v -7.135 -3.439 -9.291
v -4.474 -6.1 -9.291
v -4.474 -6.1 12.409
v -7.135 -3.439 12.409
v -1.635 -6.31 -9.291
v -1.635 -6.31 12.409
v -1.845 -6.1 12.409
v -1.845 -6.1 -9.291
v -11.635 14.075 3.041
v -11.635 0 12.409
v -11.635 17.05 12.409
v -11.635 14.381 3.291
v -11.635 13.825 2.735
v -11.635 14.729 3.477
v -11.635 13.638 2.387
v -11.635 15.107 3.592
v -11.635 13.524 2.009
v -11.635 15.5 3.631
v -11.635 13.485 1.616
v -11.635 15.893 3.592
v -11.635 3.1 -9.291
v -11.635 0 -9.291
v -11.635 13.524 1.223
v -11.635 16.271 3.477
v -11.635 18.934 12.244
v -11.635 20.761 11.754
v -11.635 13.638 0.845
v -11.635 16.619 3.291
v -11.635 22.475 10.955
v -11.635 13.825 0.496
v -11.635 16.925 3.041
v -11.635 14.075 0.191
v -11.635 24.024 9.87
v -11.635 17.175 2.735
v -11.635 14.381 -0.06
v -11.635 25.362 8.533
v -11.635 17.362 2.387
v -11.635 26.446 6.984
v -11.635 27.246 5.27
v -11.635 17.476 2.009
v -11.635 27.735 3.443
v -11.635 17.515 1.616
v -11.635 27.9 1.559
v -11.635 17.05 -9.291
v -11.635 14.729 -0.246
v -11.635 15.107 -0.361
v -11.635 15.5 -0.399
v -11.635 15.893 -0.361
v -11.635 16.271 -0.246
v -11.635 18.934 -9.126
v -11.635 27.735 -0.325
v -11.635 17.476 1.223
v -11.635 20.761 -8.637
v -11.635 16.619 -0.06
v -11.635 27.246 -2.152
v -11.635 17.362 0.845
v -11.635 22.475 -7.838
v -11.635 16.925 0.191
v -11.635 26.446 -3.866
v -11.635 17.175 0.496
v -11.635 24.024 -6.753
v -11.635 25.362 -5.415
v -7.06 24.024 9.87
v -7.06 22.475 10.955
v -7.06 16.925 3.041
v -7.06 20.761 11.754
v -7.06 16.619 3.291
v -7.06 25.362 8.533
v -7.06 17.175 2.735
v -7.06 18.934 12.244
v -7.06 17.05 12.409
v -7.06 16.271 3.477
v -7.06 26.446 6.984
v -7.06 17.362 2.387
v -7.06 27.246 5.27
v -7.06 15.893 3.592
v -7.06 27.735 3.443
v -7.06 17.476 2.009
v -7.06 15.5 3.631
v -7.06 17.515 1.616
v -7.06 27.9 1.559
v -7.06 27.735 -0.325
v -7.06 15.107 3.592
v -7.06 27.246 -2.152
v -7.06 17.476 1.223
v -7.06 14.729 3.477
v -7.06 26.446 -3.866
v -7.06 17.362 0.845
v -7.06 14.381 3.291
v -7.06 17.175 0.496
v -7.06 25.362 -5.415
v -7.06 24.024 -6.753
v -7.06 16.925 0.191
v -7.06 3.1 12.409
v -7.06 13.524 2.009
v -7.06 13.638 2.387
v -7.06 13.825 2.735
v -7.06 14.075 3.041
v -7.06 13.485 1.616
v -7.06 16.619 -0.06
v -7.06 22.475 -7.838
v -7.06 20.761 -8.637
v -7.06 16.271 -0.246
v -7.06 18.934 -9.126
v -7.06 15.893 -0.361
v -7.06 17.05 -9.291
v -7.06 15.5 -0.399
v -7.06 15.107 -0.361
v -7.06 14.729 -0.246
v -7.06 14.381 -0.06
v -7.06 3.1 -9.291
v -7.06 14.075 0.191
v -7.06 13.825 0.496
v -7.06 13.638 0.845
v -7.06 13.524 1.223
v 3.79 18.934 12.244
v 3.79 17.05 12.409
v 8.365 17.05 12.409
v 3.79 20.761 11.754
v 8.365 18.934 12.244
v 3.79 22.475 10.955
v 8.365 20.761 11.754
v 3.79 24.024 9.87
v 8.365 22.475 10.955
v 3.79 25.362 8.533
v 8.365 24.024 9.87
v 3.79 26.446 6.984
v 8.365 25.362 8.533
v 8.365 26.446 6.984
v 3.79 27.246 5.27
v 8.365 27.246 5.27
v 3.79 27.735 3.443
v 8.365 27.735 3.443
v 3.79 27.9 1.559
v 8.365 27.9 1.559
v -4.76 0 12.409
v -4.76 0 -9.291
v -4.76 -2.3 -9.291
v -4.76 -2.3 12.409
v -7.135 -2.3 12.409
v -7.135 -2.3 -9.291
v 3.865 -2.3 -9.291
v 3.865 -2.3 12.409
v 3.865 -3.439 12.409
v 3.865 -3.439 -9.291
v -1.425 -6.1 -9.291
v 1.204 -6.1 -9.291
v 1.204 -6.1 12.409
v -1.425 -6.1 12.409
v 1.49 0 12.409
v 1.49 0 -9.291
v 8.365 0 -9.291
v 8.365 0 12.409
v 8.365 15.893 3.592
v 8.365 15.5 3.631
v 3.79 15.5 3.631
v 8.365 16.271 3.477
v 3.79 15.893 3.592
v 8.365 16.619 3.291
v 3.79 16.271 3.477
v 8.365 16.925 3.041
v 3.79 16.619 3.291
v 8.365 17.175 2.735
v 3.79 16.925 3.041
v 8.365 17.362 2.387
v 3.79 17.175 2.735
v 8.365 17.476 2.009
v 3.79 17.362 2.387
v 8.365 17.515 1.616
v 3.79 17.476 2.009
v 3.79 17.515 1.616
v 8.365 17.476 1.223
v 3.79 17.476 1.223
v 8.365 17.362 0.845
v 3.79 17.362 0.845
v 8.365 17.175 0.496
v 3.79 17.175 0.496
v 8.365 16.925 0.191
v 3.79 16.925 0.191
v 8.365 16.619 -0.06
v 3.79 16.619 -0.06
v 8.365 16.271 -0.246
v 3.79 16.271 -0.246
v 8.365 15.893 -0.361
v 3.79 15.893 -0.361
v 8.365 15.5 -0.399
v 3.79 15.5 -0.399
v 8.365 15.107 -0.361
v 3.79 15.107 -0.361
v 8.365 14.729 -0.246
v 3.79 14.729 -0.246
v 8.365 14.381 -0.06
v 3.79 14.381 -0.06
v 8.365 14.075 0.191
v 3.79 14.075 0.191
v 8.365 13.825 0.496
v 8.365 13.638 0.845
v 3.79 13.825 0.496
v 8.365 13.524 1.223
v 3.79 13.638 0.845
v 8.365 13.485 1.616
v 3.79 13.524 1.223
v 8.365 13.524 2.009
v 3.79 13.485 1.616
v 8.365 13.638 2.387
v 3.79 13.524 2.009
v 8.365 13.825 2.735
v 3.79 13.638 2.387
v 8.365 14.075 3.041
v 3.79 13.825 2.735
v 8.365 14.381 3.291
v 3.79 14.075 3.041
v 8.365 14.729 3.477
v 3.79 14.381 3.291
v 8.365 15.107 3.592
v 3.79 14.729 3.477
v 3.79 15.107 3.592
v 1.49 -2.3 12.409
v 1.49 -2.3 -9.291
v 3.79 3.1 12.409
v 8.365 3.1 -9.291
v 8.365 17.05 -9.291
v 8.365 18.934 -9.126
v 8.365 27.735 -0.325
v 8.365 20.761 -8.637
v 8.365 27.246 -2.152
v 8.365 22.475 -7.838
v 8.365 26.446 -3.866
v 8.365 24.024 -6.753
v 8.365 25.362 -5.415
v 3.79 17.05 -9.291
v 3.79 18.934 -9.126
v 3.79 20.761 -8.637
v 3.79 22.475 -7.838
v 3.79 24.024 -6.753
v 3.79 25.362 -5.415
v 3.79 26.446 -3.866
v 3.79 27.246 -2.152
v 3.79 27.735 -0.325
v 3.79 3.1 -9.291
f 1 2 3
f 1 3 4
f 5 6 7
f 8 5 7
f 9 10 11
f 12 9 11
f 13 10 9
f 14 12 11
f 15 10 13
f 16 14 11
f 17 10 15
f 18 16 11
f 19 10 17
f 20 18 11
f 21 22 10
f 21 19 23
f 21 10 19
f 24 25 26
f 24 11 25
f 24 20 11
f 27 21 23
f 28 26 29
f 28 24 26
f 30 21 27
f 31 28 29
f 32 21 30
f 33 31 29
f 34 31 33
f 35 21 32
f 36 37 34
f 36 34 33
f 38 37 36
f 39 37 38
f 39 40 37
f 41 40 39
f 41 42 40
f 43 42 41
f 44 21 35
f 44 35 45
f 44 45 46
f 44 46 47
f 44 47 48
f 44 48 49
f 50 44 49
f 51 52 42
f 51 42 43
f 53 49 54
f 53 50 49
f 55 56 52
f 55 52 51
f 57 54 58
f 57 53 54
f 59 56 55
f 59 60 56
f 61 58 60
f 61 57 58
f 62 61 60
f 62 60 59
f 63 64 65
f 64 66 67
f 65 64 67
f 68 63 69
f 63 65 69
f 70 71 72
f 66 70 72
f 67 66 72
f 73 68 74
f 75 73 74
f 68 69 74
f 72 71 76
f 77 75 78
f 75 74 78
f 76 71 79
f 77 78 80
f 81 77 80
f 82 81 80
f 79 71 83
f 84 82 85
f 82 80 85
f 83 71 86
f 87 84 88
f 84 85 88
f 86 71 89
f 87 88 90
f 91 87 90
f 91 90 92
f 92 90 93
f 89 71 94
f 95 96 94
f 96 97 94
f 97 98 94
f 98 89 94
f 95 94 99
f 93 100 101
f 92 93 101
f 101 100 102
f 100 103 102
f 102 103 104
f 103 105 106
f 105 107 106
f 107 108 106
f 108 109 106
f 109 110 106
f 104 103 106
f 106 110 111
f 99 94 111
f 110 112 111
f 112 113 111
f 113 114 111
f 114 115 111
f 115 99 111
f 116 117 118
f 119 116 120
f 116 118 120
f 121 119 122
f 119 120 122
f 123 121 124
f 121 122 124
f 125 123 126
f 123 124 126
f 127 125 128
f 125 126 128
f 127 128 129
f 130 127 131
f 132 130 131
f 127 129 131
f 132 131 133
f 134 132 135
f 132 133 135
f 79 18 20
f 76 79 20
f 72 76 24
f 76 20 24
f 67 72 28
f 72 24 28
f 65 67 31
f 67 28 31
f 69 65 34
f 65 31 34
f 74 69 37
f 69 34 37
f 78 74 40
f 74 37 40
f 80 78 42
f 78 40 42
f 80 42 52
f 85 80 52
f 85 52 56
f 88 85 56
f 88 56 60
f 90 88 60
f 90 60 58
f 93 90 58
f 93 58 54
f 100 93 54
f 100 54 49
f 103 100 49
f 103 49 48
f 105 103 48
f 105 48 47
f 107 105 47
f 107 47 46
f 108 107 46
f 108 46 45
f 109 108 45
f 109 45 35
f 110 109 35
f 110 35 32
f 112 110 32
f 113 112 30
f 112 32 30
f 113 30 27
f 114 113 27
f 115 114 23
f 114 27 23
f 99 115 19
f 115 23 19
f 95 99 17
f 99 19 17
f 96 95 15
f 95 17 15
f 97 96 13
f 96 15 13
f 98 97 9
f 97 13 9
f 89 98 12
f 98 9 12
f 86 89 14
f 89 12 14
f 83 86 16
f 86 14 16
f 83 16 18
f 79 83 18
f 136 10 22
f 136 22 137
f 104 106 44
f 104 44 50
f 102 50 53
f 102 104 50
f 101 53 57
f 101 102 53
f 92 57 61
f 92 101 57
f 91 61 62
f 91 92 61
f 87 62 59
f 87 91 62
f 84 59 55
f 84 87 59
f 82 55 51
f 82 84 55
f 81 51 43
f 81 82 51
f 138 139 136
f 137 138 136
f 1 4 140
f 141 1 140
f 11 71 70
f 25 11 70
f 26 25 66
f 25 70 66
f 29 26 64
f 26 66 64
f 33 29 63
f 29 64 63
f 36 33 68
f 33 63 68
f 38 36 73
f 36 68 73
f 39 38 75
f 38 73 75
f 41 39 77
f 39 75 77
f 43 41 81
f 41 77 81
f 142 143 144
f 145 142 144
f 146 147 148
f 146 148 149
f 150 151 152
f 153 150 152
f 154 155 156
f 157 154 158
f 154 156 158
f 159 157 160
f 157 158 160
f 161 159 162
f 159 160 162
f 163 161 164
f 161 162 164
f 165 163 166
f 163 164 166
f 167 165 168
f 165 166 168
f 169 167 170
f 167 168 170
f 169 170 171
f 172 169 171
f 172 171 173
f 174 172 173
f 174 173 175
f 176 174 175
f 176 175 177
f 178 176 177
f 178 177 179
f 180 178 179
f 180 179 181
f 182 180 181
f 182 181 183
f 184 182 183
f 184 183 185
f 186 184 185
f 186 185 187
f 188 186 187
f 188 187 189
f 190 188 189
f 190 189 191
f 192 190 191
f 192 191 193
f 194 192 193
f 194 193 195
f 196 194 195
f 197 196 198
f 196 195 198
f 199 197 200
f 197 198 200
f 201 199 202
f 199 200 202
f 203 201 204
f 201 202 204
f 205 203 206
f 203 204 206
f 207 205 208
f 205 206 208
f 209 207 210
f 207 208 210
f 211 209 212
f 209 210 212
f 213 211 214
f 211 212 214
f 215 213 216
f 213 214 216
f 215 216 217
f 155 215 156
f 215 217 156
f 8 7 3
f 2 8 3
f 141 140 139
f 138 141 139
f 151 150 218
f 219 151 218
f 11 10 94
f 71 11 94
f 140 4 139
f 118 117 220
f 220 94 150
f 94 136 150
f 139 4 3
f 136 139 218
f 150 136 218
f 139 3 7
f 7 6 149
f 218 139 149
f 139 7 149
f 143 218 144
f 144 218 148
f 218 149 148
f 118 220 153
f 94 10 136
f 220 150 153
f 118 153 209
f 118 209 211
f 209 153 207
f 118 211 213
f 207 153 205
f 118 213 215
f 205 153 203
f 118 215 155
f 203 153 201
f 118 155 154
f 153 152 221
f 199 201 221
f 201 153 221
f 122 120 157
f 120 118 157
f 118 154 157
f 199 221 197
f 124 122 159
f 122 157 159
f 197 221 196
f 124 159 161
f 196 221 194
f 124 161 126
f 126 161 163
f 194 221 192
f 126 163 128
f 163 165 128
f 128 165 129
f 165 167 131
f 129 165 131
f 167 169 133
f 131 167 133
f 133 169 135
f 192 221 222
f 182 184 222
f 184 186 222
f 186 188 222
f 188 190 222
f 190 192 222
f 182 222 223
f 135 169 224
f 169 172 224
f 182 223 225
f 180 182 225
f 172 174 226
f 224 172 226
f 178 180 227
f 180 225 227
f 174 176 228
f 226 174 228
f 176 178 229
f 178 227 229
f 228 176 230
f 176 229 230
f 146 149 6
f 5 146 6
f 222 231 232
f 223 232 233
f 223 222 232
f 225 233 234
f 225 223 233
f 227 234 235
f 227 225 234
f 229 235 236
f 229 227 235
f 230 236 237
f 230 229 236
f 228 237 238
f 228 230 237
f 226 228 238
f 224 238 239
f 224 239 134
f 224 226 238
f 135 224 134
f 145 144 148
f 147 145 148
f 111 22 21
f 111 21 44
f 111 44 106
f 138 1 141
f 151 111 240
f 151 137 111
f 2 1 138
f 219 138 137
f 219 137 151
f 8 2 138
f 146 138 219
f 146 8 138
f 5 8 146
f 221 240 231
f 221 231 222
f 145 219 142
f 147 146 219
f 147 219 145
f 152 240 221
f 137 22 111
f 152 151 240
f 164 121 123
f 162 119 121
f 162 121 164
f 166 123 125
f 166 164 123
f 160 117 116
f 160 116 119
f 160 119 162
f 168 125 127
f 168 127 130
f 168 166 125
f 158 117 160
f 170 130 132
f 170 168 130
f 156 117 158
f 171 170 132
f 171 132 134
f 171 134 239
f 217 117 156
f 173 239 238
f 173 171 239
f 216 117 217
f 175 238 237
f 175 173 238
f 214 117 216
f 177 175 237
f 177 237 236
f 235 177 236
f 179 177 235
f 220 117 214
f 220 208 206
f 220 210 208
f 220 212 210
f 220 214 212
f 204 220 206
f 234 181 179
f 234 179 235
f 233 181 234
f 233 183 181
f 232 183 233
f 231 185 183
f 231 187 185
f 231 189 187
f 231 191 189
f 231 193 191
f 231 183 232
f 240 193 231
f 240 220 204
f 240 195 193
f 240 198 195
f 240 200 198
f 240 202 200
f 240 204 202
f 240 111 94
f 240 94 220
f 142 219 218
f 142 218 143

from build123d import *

# Parameters (mm, degrees)
SKETCH1_W           = 150
SKETCH1_H           = 70
BOSS_EXTRUDE1_DEPTH = 10
SKETCH2_W           = 18
SKETCH2_H           = 70
BOSS_EXTRUDE2_DEPTH = 80
FILLET1_R           = 35
SKETCH3_R           = 6.5
CUT_EXTRUDE1_DEPTH  = 164.102034121
RIB1_REACH          = 134.904
SKETCH5_WALL_W      = 321.142477346
SKETCH5_WALL_H      = 40
SKETCH7_W           = 43.830511012
SKETCH7_H           = 10.028409091
CUT_EXTRUDE2_DEPTH  = 80
SCALE1_SCALE        = 0.31
BOSS_EXTRUDE4_DEPTH = 21.7
CUT_EXTRUDE5_REACH  = 46.882
SKETCH11_W          = 1.005
SKETCH11_H          = 10.85
SKETCH11_H_2        = 13.95


with BuildPart() as part:
    # Sketch1 → Boss-Extrude1 (new body)
    with BuildSketch(Plane(origin=(0, 0, 0), x_dir=(1, 0, 0), z_dir=(0, 1, 0))):
        with Locations((14.225473782, -5.028409091)):
            Rectangle(SKETCH1_W, SKETCH1_H)
    extrude(amount=BOSS_EXTRUDE1_DEPTH)

    # Sketch2 → Boss-Extrude2 (add)
    with BuildSketch(Plane(origin=(0, 10, 0), x_dir=(1, 0, 0), z_dir=(0, 1, 0))):
        with Locations((-31.774526218, -5.028409091)):
            Rectangle(SKETCH2_W, SKETCH2_H)
        with Locations((21.225473782, -5.028409091)):
            Rectangle(SKETCH2_W, SKETCH2_H)
    extrude(amount=BOSS_EXTRUDE2_DEPTH)

    # Fillet1
    fillet1_edges = [part.edges().sort_by_distance(p)[0] for p in [
        (21.225473782, 90, 40.028409091),
        (21.225473782, 90, -29.971590909),
        (-31.774526218, 90, -29.971590909),
        (-31.774526218, 90, 40.028409091),
    ]]
    fillet(fillet1_edges, radius=FILLET1_R - 0.0001)  # a hair under: the kernel refuses the full size

    # Sketch3 → Cut-Extrude1 (cut, through all)
    with BuildSketch(Plane.ZY.offset(40.774526218)):
        with Locations((5.212032143, 50)):
            Circle(SKETCH3_R)
    extrude(amount=-CUT_EXTRUDE1_DEPTH, mode=Mode.SUBTRACT)

    # Sketch5 wall → Rib1 (add, up to next)
    with BuildSketch(Plane(origin=(52.140729288, 25.194278726, 0), x_dir=(0.821802771323, -0.569772064116, 0), z_dir=(0.569772064116, 0.821802771323, 0)), mode=Mode.PRIVATE) as rib1_sk1:
        Rectangle(SKETCH5_WALL_W, SKETCH5_WALL_H)
    rib1_tool1 = extrude(rib1_sk1.sketch, amount=-RIB1_REACH, mode=Mode.PRIVATE) - part.part
    add(rib1_tool1.solids().sort_by_distance((52.140729288, 25.194278726, 0))[0])

    # Sketch7 → Cut-Extrude2 (cut)
    with BuildSketch(Plane(origin=(0, 10, 0), x_dir=(1, 0, 0), z_dir=(0, 1, 0))):
        with Locations((52.140729288, 14.985795454)):
            Rectangle(SKETCH7_W, SKETCH7_H)
    extrude(amount=CUT_EXTRUDE2_DEPTH, mode=Mode.SUBTRACT)


with BuildPart() as part_1:
    # Scale1: scaled about (0, 0, 0)
    add(part.part.scale(SCALE1_SCALE))

    # Sketch10 → Boss-Extrude4 (add)
    with BuildSketch(Plane(origin=(0, 0, -9.291193182), x_dir=(-1, 0, 0), z_dir=(0, 0, -1))):
        Polygon((4.760103128, -1.455), (4.760103128, 0), (-1.489896872, 0), (-1.489896872, -1.455), (-1.489896872, -1.8), (-1.489896872, -2.3), (-3.864896872, -2.3), (-3.864896872, -3.439339828), (-1.204236701, -6.1), (1.425103128, -6.1), (1.635103128, -6.31), (1.845103128, -6.1), (4.474442956, -6.1), (7.135103128, -3.439339828), (7.135103128, -2.3), (4.760103128, -2.3), (4.760103128, -1.8), align=None)
    extrude(amount=-BOSS_EXTRUDE4_DEPTH)

    # Sketch11 → Cut-Extrude5 (cut, up to next)
    with BuildSketch(Plane(origin=(0, 0, -9.291193182), x_dir=(-1, 0, 0), z_dir=(0, 0, -1)), mode=Mode.PRIVATE) as cut_extrude5_sk1:
        Polygon((-9.369896872, 3.1), (-8.364896872, 3.1), (-8.364896872, 17.05), (-9.369896872, 17.05), (-9.369896872, 12.52045281), align=None)
    cut_extrude5_tool1 = extrude(cut_extrude5_sk1.sketch, amount=-CUT_EXTRUDE5_REACH, mode=Mode.PRIVATE) & part_1.part
    # Sketch11 → Cut-Extrude5 (cut, up to next)
    with BuildSketch(Plane(origin=(0, 0, -9.291193182), x_dir=(-1, 0, 0), z_dir=(0, 0, -1)), mode=Mode.PRIVATE) as cut_extrude5_sk2:
        with Locations((-8.867396872, 22.475)):
            Rectangle(SKETCH11_W, SKETCH11_H)
    cut_extrude5_tool2 = extrude(cut_extrude5_sk2.sketch, amount=-CUT_EXTRUDE5_REACH, mode=Mode.PRIVATE) & part_1.part
    # Sketch11 → Cut-Extrude5 (cut, up to next)
    with BuildSketch(Plane(origin=(0, 0, -9.291193182), x_dir=(-1, 0, 0), z_dir=(0, 0, -1)), mode=Mode.PRIVATE) as cut_extrude5_sk3:
        Polygon((-22.957355286, 3.1), (-9.369896872, 3.1), (-9.369896872, 12.52045281), align=None)
    cut_extrude5_tool3 = extrude(cut_extrude5_sk3.sketch, amount=-CUT_EXTRUDE5_REACH, mode=Mode.PRIVATE) & part_1.part
    # Sketch11 → Cut-Extrude5 (cut, up to next)
    with BuildSketch(Plane(origin=(0, 0, -9.291193182), x_dir=(-1, 0, 0), z_dir=(0, 0, -1)), mode=Mode.PRIVATE) as cut_extrude5_sk4:
        Polygon((-8.364896872, 0), (-8.364896872, 3.1), (-9.369896872, 3.1), (-22.957355286, 3.1), (-27.659896872, 3.1), (-27.659896872, 0), align=None)
    cut_extrude5_tool4 = extrude(cut_extrude5_sk4.sketch, amount=-CUT_EXTRUDE5_REACH, mode=Mode.PRIVATE) & part_1.part
    # Sketch11 → Cut-Extrude5 (cut, up to next)
    with BuildSketch(Plane(origin=(0, 0, -9.291193182), x_dir=(-1, 0, 0), z_dir=(0, 0, -1)), mode=Mode.PRIVATE) as cut_extrude5_sk5:
        with Locations((12.137603128, 10.075)):
            Rectangle(SKETCH11_W, SKETCH11_H_2)
    cut_extrude5_tool5 = extrude(cut_extrude5_sk5.sketch, amount=-CUT_EXTRUDE5_REACH, mode=Mode.PRIVATE) & part_1.part
    # Sketch11 → Cut-Extrude5 (cut, up to next)
    with BuildSketch(Plane(origin=(0, 0, -9.291193182), x_dir=(-1, 0, 0), z_dir=(0, 0, -1)), mode=Mode.PRIVATE) as cut_extrude5_sk6:
        with Locations((12.137603128, 22.475)):
            Rectangle(SKETCH11_W, SKETCH11_H)
    cut_extrude5_tool6 = extrude(cut_extrude5_sk6.sketch, amount=-CUT_EXTRUDE5_REACH, mode=Mode.PRIVATE) & part_1.part
    # Sketch11 → Cut-Extrude5 (cut, up to next)
    with BuildSketch(Plane(origin=(0, 0, -9.291193182), x_dir=(-1, 0, 0), z_dir=(0, 0, -1)), mode=Mode.PRIVATE) as cut_extrude5_sk7:
        Polygon((12.640103128, 3.1), (11.635103128, 3.1), (11.635103128, 0), (18.840103128, 0), (18.840103128, 3.1), align=None)
    cut_extrude5_tool7 = extrude(cut_extrude5_sk7.sketch, amount=-CUT_EXTRUDE5_REACH, mode=Mode.PRIVATE) & part_1.part
    add(cut_extrude5_tool1.solids().sort_by_distance((8.867397, 10.075, -9.291193))[0], mode=Mode.SUBTRACT)
    add(cut_extrude5_tool2.solids().sort_by_distance((8.867397, 22.475, -9.291193))[0], mode=Mode.SUBTRACT)
    add(cut_extrude5_tool3.solids().sort_by_distance((13.89905, 6.240151, -9.291193))[0], mode=Mode.SUBTRACT)
    add(cut_extrude5_tool4.solids().sort_by_distance((18.012397, 1.55, -9.291193))[0], mode=Mode.SUBTRACT)
    add(cut_extrude5_tool5.solids().sort_by_distance((-12.137603, 10.075, -9.291193))[0], mode=Mode.SUBTRACT)
    add(cut_extrude5_tool6.solids().sort_by_distance((-12.137603, 22.475, -9.291193))[0], mode=Mode.SUBTRACT)
    add(cut_extrude5_tool7.solids().sort_by_distance((-15.237603, 1.55, -9.291193))[0], mode=Mode.SUBTRACT)


solid = part_1.part
